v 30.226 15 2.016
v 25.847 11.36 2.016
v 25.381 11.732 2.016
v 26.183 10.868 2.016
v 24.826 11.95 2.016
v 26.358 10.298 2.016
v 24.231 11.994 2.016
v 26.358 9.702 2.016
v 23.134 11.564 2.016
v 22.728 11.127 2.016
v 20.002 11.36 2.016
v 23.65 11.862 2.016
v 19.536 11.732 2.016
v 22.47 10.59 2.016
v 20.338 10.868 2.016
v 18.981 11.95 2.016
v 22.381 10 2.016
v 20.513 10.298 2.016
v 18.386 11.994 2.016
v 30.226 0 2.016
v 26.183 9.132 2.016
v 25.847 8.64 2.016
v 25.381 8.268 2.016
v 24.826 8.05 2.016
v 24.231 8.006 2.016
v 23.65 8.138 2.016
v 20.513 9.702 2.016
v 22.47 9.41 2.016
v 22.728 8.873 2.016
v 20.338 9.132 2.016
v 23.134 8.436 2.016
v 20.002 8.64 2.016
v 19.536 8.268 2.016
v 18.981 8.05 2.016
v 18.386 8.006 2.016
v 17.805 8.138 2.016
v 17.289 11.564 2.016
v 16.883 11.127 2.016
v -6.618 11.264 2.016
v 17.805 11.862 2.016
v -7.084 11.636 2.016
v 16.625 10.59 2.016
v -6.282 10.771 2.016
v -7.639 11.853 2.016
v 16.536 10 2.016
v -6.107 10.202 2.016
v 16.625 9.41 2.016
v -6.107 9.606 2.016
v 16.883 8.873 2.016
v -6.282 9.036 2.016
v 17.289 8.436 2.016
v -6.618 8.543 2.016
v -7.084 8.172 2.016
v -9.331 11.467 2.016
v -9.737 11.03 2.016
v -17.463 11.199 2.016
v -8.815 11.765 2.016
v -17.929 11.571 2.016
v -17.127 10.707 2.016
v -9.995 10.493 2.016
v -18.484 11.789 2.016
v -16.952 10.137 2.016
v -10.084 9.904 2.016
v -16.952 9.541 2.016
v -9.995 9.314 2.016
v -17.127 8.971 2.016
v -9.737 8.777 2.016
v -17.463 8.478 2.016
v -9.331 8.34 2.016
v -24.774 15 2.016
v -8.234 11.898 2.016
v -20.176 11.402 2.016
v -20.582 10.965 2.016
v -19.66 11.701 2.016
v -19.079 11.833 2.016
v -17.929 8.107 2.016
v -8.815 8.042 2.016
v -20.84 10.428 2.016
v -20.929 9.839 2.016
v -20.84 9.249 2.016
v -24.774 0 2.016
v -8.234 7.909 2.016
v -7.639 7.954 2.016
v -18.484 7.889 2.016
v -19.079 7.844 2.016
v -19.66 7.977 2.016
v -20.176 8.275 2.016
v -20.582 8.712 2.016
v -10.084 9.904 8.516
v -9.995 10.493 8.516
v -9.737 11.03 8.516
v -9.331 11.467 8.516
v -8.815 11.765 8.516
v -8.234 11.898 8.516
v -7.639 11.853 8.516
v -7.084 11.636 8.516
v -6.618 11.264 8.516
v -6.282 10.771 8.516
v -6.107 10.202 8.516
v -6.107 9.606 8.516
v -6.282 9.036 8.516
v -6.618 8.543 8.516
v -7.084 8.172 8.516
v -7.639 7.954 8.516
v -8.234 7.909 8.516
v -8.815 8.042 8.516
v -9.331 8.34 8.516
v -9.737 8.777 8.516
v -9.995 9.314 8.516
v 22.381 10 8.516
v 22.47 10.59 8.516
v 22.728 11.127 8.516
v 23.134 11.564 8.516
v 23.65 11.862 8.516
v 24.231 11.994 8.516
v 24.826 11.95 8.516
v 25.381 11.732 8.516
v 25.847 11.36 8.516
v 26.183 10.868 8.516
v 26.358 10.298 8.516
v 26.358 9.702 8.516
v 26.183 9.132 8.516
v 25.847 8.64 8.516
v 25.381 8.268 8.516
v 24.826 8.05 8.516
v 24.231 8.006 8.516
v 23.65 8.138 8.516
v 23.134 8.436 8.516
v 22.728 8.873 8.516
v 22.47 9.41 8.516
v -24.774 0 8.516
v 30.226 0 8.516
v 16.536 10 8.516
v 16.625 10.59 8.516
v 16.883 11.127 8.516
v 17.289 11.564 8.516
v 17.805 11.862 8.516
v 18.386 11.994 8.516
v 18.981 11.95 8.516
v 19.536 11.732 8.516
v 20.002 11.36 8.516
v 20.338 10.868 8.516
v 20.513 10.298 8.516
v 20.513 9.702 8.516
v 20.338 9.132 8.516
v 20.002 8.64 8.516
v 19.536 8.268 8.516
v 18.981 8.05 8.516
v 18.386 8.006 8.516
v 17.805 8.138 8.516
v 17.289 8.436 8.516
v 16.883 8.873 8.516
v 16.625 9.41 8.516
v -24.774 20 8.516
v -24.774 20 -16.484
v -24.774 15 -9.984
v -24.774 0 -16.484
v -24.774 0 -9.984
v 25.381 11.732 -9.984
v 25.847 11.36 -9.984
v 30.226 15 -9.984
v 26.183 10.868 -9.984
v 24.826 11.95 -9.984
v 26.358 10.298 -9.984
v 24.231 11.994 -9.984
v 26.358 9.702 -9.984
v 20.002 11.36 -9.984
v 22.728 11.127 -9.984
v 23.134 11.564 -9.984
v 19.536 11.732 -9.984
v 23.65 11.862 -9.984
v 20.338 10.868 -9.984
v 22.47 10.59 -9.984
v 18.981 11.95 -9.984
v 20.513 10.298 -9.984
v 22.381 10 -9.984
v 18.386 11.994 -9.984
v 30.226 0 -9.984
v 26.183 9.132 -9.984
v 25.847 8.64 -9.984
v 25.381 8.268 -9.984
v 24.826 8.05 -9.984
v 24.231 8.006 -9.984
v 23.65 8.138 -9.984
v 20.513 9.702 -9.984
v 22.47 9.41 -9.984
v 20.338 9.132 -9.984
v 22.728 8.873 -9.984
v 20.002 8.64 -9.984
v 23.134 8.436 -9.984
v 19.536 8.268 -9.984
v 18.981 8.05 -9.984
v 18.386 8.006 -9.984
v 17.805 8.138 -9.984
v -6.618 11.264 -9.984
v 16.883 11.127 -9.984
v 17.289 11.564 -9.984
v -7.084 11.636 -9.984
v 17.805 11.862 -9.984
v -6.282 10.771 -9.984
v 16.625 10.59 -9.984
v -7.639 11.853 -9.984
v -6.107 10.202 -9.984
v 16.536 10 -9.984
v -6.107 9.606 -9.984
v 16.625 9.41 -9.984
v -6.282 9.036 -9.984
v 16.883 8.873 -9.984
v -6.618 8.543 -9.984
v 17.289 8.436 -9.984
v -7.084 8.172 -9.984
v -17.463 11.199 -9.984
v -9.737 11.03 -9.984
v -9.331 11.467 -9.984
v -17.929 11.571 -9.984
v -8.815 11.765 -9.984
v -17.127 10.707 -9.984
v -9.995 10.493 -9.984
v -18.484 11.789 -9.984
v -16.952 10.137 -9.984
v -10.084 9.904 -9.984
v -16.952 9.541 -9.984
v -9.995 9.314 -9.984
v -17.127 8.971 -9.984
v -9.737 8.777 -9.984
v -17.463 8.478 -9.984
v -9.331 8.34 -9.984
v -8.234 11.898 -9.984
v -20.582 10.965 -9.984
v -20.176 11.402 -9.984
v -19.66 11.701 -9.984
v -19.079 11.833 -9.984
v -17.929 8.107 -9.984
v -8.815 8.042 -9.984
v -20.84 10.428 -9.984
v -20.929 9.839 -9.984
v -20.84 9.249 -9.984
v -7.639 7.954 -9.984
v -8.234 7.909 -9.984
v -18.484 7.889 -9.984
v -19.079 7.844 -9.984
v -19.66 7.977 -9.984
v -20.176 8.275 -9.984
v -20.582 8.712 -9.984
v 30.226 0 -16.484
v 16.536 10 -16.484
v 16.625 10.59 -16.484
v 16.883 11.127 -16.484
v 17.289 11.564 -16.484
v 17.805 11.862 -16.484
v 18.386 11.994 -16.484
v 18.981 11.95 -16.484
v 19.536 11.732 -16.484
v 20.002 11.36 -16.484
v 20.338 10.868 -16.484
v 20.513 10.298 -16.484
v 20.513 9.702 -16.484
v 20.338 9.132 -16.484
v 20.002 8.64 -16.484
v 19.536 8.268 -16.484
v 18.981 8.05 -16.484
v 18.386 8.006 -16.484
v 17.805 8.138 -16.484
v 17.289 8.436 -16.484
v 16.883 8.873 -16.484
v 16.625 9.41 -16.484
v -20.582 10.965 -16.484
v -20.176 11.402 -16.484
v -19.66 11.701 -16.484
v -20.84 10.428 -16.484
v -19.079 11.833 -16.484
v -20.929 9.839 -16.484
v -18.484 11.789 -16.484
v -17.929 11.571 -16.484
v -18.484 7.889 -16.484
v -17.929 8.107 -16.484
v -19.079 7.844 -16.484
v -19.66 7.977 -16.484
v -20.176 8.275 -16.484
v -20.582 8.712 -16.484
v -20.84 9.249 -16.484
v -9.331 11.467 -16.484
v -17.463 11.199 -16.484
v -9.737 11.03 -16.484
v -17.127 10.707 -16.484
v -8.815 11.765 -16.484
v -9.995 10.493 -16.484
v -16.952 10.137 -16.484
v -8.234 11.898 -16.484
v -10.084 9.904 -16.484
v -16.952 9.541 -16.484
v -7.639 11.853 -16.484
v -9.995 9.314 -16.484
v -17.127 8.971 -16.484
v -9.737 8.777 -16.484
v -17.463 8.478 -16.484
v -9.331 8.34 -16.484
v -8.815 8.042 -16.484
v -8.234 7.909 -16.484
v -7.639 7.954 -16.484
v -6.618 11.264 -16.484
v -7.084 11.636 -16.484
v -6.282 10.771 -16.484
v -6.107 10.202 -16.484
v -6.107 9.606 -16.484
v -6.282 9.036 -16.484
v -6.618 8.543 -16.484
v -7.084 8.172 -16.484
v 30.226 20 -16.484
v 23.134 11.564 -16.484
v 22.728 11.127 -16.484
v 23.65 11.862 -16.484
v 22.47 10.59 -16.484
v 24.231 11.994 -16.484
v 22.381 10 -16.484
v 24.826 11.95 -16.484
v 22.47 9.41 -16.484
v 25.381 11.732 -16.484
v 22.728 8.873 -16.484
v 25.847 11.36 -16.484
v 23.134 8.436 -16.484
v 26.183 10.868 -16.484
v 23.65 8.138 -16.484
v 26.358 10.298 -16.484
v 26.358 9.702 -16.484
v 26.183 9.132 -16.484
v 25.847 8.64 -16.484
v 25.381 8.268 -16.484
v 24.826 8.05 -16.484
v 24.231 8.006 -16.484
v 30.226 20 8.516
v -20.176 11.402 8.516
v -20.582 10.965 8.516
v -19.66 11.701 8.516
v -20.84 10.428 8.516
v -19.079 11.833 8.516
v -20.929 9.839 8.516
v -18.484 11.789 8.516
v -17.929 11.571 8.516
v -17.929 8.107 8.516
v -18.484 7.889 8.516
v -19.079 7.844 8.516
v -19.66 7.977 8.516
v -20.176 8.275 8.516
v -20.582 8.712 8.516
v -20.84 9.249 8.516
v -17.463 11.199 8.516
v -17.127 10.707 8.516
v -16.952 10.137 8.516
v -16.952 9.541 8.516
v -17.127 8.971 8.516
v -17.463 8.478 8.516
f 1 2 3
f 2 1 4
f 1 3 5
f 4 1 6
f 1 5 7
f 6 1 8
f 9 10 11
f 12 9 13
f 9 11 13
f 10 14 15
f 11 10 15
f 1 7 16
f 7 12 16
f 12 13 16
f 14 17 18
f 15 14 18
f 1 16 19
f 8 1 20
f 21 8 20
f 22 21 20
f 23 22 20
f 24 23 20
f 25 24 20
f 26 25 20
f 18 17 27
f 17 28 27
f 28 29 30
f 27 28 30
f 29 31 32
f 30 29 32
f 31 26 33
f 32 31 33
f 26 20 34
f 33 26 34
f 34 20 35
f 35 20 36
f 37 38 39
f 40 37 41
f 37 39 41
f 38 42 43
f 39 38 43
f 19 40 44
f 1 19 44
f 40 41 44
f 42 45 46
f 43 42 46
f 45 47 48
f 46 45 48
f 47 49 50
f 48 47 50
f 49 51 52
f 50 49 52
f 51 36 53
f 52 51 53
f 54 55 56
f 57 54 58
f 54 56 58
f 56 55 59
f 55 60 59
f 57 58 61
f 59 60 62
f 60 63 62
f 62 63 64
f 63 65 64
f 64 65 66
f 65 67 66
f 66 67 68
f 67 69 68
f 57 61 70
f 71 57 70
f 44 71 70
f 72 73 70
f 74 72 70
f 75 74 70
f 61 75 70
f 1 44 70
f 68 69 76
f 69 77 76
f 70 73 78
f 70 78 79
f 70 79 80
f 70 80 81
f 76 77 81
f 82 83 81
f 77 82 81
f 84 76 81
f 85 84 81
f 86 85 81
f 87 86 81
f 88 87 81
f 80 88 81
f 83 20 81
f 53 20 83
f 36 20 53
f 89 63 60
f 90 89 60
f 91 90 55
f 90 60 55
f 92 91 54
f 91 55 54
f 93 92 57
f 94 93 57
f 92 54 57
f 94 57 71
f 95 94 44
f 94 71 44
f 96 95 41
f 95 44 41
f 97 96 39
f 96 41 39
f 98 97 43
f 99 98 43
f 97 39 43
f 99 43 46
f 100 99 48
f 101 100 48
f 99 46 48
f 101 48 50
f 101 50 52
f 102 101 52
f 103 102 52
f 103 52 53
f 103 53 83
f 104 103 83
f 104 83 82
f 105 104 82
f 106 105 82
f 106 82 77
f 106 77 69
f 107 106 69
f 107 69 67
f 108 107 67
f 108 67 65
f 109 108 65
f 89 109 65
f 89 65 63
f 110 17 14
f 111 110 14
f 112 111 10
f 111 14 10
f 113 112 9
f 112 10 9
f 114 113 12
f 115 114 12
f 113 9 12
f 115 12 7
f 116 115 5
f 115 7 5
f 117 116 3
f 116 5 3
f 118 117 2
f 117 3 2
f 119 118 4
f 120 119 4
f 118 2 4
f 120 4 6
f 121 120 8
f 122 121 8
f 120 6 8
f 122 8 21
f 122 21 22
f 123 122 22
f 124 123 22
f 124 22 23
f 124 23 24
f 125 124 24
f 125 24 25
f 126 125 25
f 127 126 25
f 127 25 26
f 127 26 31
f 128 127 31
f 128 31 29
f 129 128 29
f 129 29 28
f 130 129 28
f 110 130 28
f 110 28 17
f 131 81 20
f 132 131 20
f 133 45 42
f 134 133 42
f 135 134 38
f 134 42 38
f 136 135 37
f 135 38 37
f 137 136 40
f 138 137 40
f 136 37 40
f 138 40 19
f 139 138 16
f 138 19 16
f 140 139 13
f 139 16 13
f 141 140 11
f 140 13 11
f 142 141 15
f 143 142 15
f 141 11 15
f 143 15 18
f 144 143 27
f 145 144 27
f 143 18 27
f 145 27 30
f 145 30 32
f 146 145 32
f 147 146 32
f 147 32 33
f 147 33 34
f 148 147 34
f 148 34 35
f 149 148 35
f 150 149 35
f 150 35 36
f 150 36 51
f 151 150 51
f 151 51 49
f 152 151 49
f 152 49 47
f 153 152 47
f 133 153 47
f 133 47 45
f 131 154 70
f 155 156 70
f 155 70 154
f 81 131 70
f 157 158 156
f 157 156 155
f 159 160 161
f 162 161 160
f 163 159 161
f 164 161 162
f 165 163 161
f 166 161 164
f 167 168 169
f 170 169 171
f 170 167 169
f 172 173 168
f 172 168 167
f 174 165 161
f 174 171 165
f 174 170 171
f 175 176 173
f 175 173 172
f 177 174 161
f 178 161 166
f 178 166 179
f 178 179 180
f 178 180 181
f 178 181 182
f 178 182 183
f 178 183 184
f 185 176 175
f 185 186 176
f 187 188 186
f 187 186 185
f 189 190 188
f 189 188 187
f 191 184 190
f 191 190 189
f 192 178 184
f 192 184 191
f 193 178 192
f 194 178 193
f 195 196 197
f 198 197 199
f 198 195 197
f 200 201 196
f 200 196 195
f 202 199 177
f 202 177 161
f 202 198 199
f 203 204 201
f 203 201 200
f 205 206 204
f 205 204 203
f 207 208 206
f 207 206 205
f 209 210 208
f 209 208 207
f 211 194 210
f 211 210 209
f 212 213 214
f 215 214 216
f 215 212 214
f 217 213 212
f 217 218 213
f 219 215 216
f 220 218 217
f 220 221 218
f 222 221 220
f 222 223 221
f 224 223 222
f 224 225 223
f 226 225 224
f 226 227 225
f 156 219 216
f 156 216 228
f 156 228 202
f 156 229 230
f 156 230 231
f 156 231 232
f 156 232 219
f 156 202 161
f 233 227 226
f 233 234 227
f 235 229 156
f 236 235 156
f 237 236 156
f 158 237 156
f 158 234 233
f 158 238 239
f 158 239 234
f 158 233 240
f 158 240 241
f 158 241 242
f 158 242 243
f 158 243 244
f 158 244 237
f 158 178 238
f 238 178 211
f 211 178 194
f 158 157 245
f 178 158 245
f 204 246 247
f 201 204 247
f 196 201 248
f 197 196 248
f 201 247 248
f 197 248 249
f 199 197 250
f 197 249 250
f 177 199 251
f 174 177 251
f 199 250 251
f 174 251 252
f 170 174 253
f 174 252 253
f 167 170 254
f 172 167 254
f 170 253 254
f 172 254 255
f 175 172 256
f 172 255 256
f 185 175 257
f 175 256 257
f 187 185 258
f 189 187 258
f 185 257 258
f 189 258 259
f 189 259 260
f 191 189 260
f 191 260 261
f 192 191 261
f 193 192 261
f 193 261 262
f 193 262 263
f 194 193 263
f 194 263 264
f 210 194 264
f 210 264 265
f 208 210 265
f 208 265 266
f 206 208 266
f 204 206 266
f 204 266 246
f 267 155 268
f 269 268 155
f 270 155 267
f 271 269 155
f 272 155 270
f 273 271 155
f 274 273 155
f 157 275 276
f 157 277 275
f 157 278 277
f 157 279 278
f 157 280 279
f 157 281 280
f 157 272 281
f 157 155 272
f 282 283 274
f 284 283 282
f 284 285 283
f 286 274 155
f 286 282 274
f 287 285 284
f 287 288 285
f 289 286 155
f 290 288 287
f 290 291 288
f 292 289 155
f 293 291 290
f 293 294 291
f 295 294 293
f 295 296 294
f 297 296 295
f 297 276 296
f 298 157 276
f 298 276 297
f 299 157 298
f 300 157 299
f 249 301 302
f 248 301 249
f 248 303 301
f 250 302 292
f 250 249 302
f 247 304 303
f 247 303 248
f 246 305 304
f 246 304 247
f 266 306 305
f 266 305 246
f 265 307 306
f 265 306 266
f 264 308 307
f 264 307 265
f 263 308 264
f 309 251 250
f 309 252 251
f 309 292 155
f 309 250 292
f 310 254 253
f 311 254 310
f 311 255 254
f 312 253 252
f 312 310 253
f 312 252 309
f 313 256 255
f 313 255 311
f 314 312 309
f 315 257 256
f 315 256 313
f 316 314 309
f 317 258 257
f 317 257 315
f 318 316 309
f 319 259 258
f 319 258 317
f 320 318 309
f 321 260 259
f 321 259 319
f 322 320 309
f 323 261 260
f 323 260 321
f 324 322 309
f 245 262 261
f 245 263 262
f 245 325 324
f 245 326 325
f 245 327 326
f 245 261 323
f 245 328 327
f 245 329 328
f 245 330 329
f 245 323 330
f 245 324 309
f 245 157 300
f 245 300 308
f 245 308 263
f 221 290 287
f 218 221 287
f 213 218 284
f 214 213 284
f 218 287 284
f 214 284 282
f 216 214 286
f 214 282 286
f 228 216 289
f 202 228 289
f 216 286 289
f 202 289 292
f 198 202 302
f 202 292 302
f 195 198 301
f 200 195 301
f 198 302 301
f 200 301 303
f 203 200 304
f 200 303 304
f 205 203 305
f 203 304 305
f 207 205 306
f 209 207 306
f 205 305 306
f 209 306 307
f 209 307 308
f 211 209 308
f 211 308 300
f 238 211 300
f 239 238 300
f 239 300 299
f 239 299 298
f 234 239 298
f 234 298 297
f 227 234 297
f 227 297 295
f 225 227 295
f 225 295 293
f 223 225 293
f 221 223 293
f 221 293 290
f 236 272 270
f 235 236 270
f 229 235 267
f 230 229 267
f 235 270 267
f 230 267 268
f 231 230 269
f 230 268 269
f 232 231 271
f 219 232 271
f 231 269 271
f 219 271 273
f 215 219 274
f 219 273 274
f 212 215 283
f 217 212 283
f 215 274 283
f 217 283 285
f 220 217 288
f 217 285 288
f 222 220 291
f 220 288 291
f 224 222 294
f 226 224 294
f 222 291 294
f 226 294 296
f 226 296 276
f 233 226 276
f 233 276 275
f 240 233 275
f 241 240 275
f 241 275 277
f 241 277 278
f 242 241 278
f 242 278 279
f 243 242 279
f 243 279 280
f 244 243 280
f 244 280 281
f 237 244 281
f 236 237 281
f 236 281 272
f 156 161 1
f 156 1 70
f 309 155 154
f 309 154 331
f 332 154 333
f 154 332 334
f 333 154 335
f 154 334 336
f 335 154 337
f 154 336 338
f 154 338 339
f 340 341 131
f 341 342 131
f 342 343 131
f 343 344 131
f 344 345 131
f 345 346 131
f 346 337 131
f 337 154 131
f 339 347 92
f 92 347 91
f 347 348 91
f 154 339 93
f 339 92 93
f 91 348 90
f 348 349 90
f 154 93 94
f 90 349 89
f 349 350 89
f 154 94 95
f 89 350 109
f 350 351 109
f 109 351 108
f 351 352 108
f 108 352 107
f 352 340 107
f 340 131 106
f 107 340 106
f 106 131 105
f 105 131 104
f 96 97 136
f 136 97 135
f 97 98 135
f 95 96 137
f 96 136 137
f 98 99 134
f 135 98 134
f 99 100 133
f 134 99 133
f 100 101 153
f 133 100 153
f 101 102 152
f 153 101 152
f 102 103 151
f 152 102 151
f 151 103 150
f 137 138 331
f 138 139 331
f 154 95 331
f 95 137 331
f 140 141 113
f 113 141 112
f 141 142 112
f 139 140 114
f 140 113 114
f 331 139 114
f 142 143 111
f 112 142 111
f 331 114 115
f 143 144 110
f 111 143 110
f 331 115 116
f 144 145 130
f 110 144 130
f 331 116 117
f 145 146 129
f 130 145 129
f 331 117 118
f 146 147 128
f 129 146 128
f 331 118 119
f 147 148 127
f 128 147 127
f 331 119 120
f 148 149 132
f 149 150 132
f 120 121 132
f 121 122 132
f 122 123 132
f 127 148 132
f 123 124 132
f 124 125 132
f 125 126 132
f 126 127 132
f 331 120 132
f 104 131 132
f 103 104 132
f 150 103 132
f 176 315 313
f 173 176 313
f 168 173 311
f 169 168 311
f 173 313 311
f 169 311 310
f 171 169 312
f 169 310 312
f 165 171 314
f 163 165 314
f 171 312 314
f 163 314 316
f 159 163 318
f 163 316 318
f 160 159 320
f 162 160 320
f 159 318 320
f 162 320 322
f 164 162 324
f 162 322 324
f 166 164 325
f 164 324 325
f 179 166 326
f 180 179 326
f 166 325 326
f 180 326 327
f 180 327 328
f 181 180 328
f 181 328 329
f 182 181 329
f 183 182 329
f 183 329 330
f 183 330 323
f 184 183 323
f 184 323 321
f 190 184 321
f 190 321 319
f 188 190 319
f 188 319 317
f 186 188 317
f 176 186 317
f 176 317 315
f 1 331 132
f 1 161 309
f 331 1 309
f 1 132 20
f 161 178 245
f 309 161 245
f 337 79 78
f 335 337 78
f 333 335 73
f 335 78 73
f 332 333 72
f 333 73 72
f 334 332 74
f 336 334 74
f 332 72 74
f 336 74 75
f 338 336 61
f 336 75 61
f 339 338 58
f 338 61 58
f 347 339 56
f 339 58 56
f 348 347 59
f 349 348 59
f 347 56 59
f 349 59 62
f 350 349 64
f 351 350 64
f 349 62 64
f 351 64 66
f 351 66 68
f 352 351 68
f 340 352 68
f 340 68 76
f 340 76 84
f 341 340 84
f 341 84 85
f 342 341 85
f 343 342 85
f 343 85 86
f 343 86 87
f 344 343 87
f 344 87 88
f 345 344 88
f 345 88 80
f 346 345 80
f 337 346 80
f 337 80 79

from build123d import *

# Parameters (mm, degrees)
CROQUIS4_W                 = 55
CROQUIS4_H                 = 25
SALIENTE_EXTRUIR3_DEPTH    = 20
CROQUIS5_W                 = 55
CROQUIS5_H                 = 12
CORTAR_EXTRUIR1_DEPTH      = 15
CROQUIS7_R                 = 2
CORTAR_EXTRUIR3_DEPTH      = 1
CORTAR_EXTRUIR3_DEPTH_BACK = 26
CROQUIS14_R                = 2
CORTAR_EXTRUIR6_DEPTH      = 35


with BuildPart() as part:
    # Croquis4 → Saliente-Extruir3 (new body)
    with BuildSketch(Plane(origin=(0, 0, 0), x_dir=(1, 0, 0), z_dir=(0, 1, 0))):
        with Locations((2.725806452, 3.983870968)):
            Rectangle(CROQUIS4_W, CROQUIS4_H)
    extrude(amount=SALIENTE_EXTRUIR3_DEPTH)

    # Croquis5 → Cortar-Extruir1 (cut)
    with BuildSketch(Plane(origin=(0, 0, 0), x_dir=(-1, 0, 0), z_dir=(0, -1, 0))):
        with Locations((-2.725806452, 3.983870968)):
            Rectangle(CROQUIS5_W, CROQUIS5_H)
    extrude(amount=-CORTAR_EXTRUIR1_DEPTH, mode=Mode.SUBTRACT)

    # Croquis7 → Cortar-Extruir3 (cut, two sides)
    with BuildSketch(Plane(origin=(0, 0, -16.483870968), x_dir=(-1, 0, 0), z_dir=(0, 0, -1))) as cortar_extruir3_sk:
        with Locations((-24.380806452, 10)):
            Circle(CROQUIS7_R)
        with Locations((-18.535806452, 10)):
            Circle(CROQUIS7_R)
    extrude(amount=CORTAR_EXTRUIR3_DEPTH, mode=Mode.SUBTRACT)
    extrude(cortar_extruir3_sk.sketch, amount=-CORTAR_EXTRUIR3_DEPTH_BACK, mode=Mode.SUBTRACT)

    # Croquis14 → Cortar-Extruir6 (cut)
    with BuildSketch(Plane(origin=(0, 0, -16.483870968), x_dir=(-1, 0, 0), z_dir=(0, 0, -1))):
        with Locations((8.084193548, 9.903617559)):
            Circle(CROQUIS14_R)
        with Locations((18.929193548, 9.838818962)):
            Circle(CROQUIS14_R)
    extrude(amount=-CORTAR_EXTRUIR6_DEPTH, mode=Mode.SUBTRACT)


solid = part.part
